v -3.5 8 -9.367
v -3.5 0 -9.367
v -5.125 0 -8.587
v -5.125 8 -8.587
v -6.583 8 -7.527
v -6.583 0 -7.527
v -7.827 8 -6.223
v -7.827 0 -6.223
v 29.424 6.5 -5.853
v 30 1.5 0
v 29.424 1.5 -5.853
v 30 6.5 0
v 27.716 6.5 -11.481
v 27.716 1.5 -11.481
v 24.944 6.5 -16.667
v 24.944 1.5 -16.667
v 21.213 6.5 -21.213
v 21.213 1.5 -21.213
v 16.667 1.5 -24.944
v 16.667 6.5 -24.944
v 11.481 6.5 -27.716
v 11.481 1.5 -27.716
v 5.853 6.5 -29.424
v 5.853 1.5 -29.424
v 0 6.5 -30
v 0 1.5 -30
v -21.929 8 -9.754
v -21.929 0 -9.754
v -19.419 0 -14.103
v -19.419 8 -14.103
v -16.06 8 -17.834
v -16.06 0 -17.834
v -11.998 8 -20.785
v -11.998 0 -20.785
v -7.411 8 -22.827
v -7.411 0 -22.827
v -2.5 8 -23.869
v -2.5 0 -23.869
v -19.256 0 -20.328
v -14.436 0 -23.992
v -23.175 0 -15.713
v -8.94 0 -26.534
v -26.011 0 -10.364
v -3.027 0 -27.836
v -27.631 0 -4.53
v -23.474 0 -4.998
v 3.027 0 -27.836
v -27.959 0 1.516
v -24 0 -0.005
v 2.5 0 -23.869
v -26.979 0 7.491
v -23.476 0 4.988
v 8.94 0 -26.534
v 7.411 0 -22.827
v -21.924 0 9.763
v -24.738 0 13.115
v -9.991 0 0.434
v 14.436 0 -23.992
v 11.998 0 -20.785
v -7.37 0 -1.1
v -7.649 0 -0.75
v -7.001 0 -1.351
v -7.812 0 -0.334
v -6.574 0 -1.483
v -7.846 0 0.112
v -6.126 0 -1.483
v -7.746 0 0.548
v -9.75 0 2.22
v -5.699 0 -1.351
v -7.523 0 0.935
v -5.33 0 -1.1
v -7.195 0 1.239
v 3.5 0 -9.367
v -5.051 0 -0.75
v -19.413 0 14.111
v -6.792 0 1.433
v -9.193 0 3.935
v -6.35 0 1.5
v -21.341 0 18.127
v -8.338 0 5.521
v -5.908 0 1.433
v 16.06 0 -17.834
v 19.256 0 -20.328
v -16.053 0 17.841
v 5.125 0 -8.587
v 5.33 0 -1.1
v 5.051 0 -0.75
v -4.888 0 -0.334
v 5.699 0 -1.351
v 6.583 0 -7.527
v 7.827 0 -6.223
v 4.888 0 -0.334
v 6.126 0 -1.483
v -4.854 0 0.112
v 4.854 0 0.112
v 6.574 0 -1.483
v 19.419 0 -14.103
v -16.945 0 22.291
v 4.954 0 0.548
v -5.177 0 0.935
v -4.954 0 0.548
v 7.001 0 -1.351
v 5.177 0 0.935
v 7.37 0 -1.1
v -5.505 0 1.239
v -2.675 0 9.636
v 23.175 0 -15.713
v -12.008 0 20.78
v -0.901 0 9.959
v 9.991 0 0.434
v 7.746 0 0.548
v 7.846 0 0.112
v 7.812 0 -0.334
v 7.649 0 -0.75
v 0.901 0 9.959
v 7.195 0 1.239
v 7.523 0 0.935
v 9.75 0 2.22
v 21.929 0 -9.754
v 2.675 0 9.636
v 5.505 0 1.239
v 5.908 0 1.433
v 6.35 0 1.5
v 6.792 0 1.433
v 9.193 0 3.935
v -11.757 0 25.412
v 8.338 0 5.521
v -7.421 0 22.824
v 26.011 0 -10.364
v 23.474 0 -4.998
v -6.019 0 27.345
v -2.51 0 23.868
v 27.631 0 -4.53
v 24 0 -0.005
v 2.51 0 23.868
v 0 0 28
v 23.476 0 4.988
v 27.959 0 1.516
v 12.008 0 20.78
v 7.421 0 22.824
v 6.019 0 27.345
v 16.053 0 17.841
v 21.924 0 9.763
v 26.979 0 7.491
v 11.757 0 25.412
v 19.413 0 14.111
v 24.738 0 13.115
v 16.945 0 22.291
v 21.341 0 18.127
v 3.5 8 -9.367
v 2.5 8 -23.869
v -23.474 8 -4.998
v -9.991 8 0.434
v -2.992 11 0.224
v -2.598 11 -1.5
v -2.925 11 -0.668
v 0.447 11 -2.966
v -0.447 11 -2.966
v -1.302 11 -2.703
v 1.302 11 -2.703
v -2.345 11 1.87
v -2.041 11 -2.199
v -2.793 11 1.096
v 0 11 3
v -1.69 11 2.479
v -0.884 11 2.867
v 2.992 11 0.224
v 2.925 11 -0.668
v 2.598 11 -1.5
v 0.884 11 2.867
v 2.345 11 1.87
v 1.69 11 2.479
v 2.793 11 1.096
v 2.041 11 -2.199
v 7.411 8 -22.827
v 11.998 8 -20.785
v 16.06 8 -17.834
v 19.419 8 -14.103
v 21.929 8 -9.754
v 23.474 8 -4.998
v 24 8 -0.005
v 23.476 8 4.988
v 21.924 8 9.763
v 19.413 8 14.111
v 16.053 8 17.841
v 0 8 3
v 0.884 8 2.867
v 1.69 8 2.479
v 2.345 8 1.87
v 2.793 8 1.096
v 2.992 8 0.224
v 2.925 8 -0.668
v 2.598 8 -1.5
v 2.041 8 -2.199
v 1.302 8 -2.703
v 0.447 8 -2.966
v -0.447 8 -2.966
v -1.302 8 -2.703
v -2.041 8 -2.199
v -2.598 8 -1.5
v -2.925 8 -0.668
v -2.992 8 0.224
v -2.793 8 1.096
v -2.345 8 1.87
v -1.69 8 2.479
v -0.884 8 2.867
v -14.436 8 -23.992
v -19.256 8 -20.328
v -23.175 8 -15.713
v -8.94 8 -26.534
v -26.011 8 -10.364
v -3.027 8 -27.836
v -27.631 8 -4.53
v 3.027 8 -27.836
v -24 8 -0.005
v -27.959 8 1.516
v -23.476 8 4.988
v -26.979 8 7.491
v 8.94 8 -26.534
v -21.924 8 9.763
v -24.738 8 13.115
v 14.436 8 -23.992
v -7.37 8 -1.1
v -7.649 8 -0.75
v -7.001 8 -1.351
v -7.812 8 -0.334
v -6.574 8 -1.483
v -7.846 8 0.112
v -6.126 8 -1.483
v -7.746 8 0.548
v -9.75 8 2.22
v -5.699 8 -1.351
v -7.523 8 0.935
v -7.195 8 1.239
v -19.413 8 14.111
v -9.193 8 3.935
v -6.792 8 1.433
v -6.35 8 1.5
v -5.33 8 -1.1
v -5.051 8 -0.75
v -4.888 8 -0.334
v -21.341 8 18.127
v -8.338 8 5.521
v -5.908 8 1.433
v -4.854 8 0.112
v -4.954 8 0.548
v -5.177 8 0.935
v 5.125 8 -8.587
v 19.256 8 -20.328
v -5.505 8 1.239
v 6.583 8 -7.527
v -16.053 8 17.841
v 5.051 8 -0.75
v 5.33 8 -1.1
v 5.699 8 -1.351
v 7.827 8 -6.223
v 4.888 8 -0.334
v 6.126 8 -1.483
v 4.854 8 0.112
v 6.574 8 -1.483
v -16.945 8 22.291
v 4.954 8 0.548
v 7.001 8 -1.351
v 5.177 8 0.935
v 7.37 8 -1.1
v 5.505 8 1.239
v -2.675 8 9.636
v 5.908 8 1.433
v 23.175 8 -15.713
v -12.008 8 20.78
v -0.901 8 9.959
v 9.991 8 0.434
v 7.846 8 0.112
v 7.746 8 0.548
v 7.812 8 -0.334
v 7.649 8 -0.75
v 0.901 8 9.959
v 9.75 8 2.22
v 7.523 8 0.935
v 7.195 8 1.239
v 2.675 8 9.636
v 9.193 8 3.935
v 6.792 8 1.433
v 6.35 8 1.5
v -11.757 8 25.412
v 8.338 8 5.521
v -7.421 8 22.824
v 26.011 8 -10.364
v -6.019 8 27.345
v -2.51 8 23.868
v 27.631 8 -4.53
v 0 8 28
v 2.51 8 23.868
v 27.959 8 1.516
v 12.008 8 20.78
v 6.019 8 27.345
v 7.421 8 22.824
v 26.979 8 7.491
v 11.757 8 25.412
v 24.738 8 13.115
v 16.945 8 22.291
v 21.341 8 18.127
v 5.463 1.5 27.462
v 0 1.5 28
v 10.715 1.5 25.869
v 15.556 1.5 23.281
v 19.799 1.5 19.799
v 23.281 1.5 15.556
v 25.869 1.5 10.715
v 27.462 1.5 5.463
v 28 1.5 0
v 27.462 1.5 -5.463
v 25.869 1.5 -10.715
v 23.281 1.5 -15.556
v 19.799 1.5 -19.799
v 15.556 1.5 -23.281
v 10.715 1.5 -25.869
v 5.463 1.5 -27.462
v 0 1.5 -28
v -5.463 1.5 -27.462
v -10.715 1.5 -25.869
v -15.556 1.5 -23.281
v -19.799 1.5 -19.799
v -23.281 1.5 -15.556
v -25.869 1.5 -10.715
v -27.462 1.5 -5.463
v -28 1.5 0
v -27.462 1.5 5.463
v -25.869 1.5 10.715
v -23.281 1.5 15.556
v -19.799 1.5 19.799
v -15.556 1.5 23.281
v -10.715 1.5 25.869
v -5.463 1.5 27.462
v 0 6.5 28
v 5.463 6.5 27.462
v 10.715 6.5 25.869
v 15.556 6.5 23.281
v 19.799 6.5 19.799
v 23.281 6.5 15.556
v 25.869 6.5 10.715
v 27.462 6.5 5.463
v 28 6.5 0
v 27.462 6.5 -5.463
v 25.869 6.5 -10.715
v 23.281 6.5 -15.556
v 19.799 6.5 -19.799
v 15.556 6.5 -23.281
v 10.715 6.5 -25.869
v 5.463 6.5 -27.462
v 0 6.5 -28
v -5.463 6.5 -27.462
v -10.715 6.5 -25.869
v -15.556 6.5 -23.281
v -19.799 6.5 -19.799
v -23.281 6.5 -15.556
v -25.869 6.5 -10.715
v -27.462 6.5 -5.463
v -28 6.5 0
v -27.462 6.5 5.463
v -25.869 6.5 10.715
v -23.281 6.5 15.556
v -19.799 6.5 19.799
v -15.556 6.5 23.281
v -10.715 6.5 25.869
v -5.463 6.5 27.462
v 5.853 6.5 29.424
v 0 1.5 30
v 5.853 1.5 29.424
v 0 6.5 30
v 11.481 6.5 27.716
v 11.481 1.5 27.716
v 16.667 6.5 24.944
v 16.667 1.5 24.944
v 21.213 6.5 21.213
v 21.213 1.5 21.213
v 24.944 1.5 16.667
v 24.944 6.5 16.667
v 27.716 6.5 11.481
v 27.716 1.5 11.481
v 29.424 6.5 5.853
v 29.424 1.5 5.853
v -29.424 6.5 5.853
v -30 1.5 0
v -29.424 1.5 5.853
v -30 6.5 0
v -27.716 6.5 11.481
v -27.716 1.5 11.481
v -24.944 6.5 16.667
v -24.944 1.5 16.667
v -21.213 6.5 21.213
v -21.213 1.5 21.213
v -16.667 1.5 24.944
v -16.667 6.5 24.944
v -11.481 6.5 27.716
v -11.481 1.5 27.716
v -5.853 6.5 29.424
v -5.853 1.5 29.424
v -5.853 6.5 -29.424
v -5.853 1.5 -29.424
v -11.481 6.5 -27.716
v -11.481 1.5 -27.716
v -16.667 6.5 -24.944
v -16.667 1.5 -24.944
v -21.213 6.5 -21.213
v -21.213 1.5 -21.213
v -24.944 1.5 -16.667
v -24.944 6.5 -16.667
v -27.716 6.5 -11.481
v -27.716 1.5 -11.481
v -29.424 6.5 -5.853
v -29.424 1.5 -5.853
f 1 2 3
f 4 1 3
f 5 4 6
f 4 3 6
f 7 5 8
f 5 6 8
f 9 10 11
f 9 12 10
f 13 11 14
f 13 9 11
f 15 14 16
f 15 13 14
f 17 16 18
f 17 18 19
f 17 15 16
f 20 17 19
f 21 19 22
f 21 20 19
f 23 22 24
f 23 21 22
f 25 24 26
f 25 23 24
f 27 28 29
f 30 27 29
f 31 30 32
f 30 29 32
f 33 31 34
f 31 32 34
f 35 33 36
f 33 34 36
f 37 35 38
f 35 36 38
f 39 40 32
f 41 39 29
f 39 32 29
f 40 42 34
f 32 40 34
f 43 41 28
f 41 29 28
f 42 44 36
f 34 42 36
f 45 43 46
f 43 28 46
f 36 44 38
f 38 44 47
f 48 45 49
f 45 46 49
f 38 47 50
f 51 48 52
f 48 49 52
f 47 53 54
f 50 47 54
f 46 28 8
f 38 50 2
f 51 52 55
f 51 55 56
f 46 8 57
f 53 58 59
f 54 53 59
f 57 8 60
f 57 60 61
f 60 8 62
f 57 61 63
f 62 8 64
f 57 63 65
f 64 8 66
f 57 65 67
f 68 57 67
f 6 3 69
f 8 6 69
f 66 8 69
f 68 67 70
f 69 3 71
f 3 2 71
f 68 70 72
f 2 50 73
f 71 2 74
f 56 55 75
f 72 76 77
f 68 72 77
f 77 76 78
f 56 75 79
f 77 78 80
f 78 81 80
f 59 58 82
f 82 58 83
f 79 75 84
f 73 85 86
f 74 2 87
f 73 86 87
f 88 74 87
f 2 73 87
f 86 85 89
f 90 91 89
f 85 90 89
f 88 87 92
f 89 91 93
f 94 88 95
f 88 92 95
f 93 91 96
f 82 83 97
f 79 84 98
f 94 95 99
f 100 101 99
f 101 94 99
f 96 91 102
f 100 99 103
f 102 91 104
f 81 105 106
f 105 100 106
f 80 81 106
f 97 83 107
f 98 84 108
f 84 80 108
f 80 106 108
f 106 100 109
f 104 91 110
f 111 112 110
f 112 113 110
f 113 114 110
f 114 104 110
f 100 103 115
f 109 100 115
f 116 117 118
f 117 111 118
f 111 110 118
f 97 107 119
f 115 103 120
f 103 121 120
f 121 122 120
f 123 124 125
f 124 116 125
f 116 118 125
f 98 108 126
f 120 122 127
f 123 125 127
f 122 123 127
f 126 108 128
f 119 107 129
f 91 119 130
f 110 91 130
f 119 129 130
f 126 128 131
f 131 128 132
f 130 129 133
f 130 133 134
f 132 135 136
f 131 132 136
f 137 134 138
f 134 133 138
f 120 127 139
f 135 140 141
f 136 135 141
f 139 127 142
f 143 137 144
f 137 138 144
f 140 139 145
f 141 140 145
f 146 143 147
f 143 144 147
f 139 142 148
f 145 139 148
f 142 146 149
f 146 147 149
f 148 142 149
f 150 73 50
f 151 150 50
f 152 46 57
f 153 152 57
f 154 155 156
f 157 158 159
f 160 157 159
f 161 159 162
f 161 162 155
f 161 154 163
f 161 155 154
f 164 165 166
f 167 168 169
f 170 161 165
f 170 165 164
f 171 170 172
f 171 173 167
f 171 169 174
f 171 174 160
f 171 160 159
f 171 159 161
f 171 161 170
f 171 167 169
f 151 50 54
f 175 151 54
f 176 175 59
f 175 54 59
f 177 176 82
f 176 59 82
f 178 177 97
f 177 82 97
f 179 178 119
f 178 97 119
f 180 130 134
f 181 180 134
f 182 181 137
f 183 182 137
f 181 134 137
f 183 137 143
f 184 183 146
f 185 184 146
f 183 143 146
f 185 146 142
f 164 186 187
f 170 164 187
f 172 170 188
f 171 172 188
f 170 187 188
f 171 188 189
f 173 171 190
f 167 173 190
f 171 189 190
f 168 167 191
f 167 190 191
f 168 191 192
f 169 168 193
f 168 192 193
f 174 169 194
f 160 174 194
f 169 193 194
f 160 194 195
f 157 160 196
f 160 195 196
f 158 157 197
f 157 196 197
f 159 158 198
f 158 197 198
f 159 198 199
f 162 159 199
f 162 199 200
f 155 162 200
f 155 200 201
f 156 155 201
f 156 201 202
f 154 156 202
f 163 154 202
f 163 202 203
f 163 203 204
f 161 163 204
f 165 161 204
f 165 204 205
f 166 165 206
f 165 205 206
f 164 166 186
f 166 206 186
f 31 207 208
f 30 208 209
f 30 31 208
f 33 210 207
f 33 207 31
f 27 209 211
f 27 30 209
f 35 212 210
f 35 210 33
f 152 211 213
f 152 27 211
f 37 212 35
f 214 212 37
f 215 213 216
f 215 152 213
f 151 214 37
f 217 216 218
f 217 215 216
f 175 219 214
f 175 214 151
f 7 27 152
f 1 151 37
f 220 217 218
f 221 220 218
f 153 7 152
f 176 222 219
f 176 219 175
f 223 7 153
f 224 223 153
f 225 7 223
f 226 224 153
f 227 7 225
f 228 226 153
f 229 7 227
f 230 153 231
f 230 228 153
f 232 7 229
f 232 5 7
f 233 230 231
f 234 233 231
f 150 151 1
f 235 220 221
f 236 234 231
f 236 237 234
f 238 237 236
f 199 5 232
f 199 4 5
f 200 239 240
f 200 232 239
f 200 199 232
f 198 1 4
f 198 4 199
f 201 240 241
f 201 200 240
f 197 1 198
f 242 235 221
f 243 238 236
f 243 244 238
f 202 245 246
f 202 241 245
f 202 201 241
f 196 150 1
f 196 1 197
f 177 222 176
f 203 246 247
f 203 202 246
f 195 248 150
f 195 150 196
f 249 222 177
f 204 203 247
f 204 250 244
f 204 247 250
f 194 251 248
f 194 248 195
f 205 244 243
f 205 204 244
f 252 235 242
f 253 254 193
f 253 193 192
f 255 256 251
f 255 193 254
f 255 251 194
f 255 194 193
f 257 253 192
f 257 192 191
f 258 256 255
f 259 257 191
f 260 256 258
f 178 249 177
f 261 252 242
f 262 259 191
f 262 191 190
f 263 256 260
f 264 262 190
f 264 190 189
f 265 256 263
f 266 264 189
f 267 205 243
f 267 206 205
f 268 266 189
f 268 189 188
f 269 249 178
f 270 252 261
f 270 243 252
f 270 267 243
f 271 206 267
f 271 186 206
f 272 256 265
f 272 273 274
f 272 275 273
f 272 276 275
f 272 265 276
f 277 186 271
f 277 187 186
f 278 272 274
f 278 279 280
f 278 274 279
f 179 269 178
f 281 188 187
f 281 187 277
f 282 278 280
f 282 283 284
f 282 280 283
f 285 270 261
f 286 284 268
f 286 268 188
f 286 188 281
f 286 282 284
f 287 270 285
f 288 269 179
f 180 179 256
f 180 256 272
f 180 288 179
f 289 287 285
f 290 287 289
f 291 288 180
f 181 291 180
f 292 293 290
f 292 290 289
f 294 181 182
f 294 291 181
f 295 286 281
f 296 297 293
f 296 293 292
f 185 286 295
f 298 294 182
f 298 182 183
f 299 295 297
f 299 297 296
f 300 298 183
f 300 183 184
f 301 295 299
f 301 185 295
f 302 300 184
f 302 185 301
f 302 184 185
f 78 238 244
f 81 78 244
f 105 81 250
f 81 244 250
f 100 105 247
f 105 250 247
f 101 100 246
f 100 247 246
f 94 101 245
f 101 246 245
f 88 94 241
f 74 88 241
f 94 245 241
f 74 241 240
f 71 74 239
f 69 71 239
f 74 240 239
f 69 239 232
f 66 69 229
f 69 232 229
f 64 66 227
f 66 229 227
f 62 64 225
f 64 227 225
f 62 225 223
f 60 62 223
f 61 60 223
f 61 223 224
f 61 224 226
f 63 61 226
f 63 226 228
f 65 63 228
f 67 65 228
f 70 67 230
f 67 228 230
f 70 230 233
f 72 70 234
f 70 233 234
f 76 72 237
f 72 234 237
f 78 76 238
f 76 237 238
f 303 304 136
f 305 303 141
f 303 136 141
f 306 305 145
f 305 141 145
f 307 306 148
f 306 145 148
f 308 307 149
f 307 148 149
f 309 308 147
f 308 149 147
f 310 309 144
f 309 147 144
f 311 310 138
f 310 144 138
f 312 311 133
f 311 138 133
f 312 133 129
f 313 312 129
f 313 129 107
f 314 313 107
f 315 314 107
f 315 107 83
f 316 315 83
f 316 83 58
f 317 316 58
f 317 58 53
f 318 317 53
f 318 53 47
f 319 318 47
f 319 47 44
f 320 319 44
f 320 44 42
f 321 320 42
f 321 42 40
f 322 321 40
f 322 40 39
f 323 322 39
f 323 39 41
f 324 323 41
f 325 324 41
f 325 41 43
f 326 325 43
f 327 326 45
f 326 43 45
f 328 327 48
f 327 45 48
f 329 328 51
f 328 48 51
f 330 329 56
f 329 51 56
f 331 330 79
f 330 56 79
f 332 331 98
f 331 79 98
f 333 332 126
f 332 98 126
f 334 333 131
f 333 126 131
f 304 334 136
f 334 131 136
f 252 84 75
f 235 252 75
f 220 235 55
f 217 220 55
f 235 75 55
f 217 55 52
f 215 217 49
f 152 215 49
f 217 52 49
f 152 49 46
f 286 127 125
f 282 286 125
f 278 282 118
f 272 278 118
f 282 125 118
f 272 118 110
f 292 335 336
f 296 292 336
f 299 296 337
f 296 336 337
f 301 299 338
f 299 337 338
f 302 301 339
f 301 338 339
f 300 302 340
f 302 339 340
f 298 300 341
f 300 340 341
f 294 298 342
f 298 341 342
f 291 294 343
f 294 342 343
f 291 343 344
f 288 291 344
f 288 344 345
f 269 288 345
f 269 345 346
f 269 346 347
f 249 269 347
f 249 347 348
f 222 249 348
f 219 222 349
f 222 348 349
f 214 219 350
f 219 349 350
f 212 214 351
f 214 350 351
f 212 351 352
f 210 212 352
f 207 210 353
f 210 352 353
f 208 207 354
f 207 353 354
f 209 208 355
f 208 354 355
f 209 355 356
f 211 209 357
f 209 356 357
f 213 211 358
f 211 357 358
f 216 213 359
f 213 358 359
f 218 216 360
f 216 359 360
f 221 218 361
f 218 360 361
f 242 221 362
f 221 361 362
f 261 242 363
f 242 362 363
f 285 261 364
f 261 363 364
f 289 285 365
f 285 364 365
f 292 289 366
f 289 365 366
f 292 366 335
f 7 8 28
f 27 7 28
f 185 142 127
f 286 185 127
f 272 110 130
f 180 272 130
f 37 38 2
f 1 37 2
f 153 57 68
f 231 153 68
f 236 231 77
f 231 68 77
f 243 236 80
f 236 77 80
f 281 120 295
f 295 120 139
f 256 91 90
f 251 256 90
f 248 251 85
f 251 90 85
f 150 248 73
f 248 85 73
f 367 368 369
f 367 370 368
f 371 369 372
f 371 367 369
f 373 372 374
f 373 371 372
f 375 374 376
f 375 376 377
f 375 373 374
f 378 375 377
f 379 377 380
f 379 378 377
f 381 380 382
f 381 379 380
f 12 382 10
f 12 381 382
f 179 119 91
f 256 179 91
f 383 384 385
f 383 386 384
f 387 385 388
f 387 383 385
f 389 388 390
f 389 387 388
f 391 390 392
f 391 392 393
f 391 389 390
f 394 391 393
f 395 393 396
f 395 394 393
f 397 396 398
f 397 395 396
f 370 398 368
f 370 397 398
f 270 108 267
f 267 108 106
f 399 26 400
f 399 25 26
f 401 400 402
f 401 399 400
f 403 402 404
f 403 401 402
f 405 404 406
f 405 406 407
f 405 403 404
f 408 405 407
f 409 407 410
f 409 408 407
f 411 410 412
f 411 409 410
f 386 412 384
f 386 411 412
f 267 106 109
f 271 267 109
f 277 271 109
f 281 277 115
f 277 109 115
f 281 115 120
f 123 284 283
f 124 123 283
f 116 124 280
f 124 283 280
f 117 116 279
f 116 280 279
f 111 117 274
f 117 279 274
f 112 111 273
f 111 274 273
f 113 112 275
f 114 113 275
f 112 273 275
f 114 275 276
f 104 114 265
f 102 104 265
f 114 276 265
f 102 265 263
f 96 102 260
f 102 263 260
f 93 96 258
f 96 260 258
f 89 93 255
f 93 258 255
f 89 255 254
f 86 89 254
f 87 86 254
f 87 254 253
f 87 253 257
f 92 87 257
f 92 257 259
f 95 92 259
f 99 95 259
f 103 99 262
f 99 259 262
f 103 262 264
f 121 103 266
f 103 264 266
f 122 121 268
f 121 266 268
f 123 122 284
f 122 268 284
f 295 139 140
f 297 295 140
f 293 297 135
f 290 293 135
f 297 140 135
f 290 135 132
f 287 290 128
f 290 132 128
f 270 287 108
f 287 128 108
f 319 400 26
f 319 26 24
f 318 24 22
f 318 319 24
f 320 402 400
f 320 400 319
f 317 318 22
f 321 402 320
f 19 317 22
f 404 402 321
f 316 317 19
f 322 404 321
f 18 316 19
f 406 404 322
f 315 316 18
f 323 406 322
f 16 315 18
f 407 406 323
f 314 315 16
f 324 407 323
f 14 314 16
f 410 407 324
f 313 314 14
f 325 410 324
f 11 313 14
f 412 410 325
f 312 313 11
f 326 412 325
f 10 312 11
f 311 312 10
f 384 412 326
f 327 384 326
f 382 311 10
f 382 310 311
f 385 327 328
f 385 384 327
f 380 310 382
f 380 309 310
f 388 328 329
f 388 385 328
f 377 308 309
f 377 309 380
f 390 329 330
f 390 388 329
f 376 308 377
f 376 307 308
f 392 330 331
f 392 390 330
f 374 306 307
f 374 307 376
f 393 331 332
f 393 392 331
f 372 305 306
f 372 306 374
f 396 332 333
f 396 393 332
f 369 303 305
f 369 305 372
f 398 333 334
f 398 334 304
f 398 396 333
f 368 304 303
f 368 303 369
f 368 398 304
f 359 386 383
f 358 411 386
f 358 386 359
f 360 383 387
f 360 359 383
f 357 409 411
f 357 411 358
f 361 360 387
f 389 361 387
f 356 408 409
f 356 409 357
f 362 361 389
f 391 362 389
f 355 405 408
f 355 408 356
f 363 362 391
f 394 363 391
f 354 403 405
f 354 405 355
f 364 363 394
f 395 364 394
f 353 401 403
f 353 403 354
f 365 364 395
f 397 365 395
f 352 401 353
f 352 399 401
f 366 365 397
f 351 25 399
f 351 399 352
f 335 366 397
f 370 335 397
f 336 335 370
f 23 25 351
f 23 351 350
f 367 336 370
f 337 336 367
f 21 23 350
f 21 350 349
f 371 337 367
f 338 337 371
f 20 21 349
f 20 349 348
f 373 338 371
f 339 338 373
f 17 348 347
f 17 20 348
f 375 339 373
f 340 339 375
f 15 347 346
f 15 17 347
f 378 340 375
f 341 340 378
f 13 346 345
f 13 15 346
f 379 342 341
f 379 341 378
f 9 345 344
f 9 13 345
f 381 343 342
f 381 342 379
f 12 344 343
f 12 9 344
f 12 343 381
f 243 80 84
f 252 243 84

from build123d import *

# Parameters (mm, degrees)
SKETCH1_R           = 28
BOSS_EXTRUDE1_DEPTH = 8
SKETCH2_R           = 1.5
CUT_EXTRUDE1_DEPTH  = 8
SKETCH3_W           = 2
SKETCH3_H           = 5
SKETCH4_R           = 3
BOSS_EXTRUDE2_DEPTH = 3


with BuildPart() as part:
    # Sketch1 → Boss-Extrude1 (new body)
    with BuildSketch(Plane(origin=(0, 0, 0), x_dir=(1, 0, 0), z_dir=(0, 1, 0))):
        with Locations(Location((0, 0, 0), (0, 0, 270))):
            Circle(SKETCH1_R)
        with BuildLine():
            Line((-2.5, 23.869436525), (-3.5, 9.367496998))
            ThreePointArc((-3.5, 9.367496998), (-5.877852523, 8.090169944), (-7.827459581, 6.223413574))
            Line((-7.827459581, 6.223413574), (-21.928640661, 9.753702823))
            ThreePointArc((-21.928640661, 9.753702823), (-14.106846055, 19.416407865), (-2.5, 23.869436525))
        make_face(mode=Mode.SUBTRACT)
        with BuildLine():
            Line((3.5, 9.367496998), (2.5, 23.869436525))
            ThreePointArc((2.5, 23.869436525), (14.106846055, 19.416407865), (21.928640661, 9.753702823))
            Line((21.928640661, 9.753702823), (7.827459581, 6.223413574))
            ThreePointArc((7.827459581, 6.223413574), (5.877852523, 8.090169944), (3.5, 9.367496998))
        make_face(mode=Mode.SUBTRACT)
        with BuildLine():
            Line((9.990578541, -0.43398204), (23.473725633, 4.998420242))
            ThreePointArc((23.473725633, 4.998420242), (22.825356391, -7.416407865), (16.052645256, -17.841316664))
            Line((16.052645256, -17.841316664), (8.337636066, -5.521215883))
            ThreePointArc((8.337636066, -5.521215883), (9.510565163, -3.090169944), (9.990578541, -0.43398204))
        make_face(mode=Mode.SUBTRACT)
        with BuildLine():
            Line((2.674517106, -9.635712649), (12.007560284, -20.780242925))
            ThreePointArc((12.007560284, -20.780242925), (0, -24), (-12.007560284, -20.780242925))
            Line((-12.007560284, -20.780242925), (-2.674517106, -9.635712649))
            ThreePointArc((-2.674517106, -9.635712649), (0, -10), (2.674517106, -9.635712649))
        make_face(mode=Mode.SUBTRACT)
        with BuildLine():
            Line((-8.337636066, -5.521215883), (-16.052645256, -17.841316664))
            ThreePointArc((-16.052645256, -17.841316664), (-22.825356391, -7.416407865), (-23.473725633, 4.998420242))
            Line((-23.473725633, 4.998420242), (-9.990578541, -0.43398204))
            ThreePointArc((-9.990578541, -0.43398204), (-9.510565163, -3.090169944), (-8.337636066, -5.521215883))
        make_face(mode=Mode.SUBTRACT)
    extrude(amount=BOSS_EXTRUDE1_DEPTH)

    # Sketch2 → Cut-Extrude1 (cut)
    with BuildSketch(Plane(origin=(0, 8, 0), x_dir=(1, 0, 0), z_dir=(0, 1, 0))):
        with Locations(Location((-6.35, 0, 0), (0, 0, 270))):
            Circle(SKETCH2_R)
        with Locations(Location((6.35, 0, 0), (0, 0, 270))):
            Circle(SKETCH2_R)
    extrude(amount=-CUT_EXTRUDE1_DEPTH, mode=Mode.SUBTRACT)

    # Sweep1: sweep along a curve in space
    with BuildLine() as sweep1_path:
        ThreePointArc((0, 8, 28), (19.798989873, 8, 19.798989873), (28, 8, 0))
        ThreePointArc((28, 8, 0), (19.798989873, 8, -19.798989873), (0, 8, -28))
        ThreePointArc((0, 8, -28), (-19.798989873, 8, -19.798989873), (-28, 8, 0))
        ThreePointArc((-28, 8, 0), (-19.798989873, 8, 19.798989873), (0, 8, 28))
    # Sketch3 → Sweep1 (sweep)
    with BuildSketch(Plane(origin=(0, 0, 0), x_dir=(0, 0, -1), z_dir=(1, 0, 0))):
        with Locations((29, 4)):
            Rectangle(SKETCH3_W, SKETCH3_H)
    sweep(path=sweep1_path.line)

    # Sketch4 → Boss-Extrude2 (add)
    with BuildSketch(Plane(origin=(0, 8, 0), x_dir=(1, 0, 0), z_dir=(0, 1, 0))):
        with Locations(Location((0, 0, 0), (0, 0, 270))):
            Circle(SKETCH4_R)
    extrude(amount=BOSS_EXTRUDE2_DEPTH)


solid = part.part
